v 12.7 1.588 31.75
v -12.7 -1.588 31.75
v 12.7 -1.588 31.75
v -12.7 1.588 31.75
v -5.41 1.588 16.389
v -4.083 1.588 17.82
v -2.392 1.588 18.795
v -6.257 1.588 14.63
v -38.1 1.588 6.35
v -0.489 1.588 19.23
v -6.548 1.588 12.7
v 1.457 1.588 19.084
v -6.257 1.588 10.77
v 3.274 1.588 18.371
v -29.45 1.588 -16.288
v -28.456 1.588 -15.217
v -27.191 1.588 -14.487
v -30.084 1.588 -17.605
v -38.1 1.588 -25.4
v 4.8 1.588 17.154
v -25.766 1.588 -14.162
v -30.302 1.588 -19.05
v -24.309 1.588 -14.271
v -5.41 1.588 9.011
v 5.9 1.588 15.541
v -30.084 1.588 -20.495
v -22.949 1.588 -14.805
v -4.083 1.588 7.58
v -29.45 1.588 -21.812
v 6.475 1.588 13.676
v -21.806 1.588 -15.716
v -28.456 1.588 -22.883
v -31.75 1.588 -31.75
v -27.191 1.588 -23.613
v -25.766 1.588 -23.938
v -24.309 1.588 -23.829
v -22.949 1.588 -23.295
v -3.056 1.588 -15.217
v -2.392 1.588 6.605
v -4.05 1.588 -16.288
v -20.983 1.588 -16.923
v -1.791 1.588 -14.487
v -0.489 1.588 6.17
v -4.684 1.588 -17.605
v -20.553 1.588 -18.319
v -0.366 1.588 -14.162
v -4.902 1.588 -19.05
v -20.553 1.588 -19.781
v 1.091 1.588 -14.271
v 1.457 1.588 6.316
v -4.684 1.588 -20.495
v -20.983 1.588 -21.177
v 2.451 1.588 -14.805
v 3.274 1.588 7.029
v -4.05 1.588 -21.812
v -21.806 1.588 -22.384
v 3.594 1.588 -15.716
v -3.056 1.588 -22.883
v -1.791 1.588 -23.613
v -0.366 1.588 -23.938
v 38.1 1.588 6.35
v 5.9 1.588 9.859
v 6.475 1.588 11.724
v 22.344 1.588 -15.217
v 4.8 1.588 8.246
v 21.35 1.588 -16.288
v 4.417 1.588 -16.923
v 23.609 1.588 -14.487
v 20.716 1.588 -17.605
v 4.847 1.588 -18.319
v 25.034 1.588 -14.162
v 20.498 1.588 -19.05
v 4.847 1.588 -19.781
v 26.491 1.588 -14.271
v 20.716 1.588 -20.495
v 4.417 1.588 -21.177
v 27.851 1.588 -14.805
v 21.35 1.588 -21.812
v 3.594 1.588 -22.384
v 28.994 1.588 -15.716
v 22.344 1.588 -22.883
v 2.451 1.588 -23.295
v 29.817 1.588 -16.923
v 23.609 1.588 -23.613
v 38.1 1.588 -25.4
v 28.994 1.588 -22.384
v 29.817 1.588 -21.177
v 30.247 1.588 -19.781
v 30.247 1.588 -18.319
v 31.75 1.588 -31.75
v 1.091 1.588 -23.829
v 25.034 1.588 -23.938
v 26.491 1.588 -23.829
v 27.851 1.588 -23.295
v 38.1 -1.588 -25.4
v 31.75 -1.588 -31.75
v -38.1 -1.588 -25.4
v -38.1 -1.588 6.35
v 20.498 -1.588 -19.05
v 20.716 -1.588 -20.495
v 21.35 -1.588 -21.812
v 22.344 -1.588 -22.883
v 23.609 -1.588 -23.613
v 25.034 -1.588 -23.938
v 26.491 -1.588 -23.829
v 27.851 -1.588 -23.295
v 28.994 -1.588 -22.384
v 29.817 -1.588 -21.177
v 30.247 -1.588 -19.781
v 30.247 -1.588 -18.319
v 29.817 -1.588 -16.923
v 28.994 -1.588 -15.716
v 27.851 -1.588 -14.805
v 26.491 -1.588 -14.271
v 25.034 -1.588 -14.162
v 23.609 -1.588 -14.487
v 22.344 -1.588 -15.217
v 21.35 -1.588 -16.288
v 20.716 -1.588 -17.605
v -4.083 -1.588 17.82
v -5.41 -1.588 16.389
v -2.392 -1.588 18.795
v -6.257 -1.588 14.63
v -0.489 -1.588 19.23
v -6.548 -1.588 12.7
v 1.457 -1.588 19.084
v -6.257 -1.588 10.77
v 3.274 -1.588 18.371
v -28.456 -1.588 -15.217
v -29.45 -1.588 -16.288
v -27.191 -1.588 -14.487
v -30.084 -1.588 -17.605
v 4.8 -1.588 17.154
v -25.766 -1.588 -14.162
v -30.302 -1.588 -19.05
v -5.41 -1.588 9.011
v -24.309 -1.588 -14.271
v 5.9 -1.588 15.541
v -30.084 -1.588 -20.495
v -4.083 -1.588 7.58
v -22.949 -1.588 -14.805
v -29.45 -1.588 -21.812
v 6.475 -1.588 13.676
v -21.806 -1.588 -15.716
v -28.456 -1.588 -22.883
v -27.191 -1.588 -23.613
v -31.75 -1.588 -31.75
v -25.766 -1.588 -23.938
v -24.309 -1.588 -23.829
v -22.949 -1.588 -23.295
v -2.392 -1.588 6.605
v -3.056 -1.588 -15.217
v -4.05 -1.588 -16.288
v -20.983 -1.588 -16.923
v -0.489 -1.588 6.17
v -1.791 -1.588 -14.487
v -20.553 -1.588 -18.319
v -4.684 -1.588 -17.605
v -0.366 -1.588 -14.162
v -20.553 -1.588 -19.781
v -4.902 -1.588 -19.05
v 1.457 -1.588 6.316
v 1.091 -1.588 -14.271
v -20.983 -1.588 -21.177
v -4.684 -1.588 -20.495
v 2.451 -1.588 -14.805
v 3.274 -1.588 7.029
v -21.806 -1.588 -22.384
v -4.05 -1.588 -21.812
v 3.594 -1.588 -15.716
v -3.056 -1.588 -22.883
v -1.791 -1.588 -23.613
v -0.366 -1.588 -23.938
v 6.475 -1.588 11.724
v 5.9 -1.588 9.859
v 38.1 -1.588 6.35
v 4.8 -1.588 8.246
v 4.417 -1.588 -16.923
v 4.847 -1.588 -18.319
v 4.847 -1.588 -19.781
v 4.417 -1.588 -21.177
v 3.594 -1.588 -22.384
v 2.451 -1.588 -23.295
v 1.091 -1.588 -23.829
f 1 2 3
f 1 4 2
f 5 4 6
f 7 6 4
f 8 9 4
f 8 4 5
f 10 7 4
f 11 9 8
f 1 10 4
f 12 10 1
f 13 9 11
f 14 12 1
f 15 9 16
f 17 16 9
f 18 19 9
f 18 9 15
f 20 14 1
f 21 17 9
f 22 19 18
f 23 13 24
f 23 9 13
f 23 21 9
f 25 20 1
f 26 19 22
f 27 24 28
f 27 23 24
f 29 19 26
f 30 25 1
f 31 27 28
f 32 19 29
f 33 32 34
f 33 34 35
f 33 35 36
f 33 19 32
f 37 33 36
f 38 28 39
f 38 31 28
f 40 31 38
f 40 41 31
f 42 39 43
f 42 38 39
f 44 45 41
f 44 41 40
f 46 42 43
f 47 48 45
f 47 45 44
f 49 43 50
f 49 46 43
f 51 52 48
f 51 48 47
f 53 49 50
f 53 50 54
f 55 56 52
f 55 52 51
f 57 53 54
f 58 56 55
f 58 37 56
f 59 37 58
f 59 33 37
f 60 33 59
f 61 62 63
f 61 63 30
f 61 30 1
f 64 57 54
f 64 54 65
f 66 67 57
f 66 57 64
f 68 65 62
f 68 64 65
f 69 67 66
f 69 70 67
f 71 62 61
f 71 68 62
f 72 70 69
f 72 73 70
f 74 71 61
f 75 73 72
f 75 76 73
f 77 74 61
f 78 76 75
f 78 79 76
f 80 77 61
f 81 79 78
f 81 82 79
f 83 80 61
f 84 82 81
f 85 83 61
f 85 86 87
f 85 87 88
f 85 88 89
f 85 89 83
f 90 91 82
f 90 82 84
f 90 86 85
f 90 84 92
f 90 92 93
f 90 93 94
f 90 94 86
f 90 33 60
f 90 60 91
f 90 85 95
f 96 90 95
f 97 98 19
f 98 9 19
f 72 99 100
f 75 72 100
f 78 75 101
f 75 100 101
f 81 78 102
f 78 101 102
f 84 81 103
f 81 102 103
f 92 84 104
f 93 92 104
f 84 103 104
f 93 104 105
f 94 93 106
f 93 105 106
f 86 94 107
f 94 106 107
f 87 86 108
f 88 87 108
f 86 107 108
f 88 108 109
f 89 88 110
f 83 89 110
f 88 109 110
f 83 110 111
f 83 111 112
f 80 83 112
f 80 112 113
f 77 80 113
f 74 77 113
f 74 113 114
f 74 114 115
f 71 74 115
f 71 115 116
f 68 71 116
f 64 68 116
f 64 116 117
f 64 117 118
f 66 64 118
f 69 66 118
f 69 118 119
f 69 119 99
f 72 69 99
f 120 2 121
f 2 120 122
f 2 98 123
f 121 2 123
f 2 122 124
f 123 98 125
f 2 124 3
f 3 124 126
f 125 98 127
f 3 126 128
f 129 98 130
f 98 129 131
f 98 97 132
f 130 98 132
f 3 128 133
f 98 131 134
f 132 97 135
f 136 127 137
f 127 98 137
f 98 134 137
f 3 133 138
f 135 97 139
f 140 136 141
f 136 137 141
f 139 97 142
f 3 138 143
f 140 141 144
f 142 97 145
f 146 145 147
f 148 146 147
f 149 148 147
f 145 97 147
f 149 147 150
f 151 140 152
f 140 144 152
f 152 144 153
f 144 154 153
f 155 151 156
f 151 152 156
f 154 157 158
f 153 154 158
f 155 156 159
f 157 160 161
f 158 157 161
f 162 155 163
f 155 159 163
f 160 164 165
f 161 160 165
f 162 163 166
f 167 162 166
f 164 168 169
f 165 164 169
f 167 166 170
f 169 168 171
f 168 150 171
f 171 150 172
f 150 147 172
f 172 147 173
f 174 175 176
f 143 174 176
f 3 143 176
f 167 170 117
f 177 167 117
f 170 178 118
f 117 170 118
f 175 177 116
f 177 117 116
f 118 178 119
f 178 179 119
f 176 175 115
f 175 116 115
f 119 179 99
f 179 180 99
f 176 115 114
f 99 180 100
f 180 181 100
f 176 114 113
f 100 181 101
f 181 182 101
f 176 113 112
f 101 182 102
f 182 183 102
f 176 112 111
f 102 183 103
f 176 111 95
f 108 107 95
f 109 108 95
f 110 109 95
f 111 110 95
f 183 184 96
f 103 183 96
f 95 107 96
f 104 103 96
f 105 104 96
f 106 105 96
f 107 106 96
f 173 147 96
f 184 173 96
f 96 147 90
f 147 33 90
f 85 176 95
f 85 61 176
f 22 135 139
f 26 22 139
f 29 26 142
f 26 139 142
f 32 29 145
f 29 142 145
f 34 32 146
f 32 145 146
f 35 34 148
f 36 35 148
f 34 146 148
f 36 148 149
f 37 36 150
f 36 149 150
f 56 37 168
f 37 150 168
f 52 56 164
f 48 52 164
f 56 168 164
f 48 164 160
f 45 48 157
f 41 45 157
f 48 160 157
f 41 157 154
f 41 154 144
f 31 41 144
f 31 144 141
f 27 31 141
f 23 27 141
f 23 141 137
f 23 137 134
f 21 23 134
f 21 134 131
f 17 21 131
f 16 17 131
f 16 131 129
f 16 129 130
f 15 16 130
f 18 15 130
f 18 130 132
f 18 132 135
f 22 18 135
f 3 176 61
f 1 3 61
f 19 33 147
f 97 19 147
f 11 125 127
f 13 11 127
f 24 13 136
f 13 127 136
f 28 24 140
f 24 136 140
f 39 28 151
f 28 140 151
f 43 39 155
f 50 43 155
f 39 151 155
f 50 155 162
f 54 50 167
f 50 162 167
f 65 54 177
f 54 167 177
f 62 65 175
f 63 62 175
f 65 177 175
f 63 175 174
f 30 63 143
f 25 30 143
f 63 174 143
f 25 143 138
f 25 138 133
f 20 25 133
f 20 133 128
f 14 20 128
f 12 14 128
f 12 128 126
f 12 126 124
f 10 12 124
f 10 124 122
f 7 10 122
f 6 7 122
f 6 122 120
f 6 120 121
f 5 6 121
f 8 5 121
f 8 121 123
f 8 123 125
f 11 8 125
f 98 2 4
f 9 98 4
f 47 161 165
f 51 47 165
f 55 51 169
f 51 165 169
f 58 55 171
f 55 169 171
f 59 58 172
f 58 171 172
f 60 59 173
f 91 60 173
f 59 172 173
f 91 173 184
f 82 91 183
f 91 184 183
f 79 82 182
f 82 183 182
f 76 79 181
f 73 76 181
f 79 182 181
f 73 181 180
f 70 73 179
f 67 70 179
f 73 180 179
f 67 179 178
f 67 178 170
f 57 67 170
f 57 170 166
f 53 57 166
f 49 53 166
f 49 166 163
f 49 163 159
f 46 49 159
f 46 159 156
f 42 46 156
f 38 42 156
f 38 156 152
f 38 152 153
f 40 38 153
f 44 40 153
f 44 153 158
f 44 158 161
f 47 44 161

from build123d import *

# Parameters (mm, degrees)
SKETCH1_W               = 76.2
SKETCH1_H               = 63.5
BOSS_EXTRUDE1_DEPTH     = 1.5875
F_3_8_CLEARANCE_HOLE1_D = 9.8044
F_1_2_CLEARANCE_HOLE1_D = 13.09624
CHAMFER1_SIZE           = 25.4
CHAMFER2_SIZE           = 6.35


with BuildPart() as part:
    # Sketch1 → Boss-Extrude1 (new, symmetric)
    with BuildSketch(Plane(origin=(0, 0, 0), x_dir=(1, 0, 0), z_dir=(0, 1, 0))):
        Rectangle(SKETCH1_W, SKETCH1_H)
    extrude(amount=BOSS_EXTRUDE1_DEPTH, both=True)

    # 3/8 Clearance Hole1 (through all)
    with Locations(Plane(origin=(0, 1.5875, 0), x_dir=(1, 0, 0), z_dir=(0, 1, 0))):
        with Locations((0, 19.05), (25.4, 19.05), (-25.4, 19.05)):
            Hole(F_3_8_CLEARANCE_HOLE1_D / 2)

    # 1/2 Clearance Hole1 (through all)
    with Locations(Plane(origin=(0, 1.5875, 0), x_dir=(1, 0, 0), z_dir=(0, 1, 0))):
        with Locations((0, -12.7)):
            Hole(F_1_2_CLEARANCE_HOLE1_D / 2)

    # Chamfer1
    chamfer1_edges = [part.edges().sort_by_distance(p)[0] for p in [
        (38.1, 0, 31.75),
        (-38.1, 0, 31.75),
    ]]
    chamfer(chamfer1_edges, length=CHAMFER1_SIZE)

    # Chamfer2
    chamfer2_edges = [part.edges().sort_by_distance(p)[0] for p in [
        (-38.1, 0, -31.75),
        (38.1, 0, -31.75),
    ]]
    chamfer(chamfer2_edges, length=CHAMFER2_SIZE)


solid = part.part
